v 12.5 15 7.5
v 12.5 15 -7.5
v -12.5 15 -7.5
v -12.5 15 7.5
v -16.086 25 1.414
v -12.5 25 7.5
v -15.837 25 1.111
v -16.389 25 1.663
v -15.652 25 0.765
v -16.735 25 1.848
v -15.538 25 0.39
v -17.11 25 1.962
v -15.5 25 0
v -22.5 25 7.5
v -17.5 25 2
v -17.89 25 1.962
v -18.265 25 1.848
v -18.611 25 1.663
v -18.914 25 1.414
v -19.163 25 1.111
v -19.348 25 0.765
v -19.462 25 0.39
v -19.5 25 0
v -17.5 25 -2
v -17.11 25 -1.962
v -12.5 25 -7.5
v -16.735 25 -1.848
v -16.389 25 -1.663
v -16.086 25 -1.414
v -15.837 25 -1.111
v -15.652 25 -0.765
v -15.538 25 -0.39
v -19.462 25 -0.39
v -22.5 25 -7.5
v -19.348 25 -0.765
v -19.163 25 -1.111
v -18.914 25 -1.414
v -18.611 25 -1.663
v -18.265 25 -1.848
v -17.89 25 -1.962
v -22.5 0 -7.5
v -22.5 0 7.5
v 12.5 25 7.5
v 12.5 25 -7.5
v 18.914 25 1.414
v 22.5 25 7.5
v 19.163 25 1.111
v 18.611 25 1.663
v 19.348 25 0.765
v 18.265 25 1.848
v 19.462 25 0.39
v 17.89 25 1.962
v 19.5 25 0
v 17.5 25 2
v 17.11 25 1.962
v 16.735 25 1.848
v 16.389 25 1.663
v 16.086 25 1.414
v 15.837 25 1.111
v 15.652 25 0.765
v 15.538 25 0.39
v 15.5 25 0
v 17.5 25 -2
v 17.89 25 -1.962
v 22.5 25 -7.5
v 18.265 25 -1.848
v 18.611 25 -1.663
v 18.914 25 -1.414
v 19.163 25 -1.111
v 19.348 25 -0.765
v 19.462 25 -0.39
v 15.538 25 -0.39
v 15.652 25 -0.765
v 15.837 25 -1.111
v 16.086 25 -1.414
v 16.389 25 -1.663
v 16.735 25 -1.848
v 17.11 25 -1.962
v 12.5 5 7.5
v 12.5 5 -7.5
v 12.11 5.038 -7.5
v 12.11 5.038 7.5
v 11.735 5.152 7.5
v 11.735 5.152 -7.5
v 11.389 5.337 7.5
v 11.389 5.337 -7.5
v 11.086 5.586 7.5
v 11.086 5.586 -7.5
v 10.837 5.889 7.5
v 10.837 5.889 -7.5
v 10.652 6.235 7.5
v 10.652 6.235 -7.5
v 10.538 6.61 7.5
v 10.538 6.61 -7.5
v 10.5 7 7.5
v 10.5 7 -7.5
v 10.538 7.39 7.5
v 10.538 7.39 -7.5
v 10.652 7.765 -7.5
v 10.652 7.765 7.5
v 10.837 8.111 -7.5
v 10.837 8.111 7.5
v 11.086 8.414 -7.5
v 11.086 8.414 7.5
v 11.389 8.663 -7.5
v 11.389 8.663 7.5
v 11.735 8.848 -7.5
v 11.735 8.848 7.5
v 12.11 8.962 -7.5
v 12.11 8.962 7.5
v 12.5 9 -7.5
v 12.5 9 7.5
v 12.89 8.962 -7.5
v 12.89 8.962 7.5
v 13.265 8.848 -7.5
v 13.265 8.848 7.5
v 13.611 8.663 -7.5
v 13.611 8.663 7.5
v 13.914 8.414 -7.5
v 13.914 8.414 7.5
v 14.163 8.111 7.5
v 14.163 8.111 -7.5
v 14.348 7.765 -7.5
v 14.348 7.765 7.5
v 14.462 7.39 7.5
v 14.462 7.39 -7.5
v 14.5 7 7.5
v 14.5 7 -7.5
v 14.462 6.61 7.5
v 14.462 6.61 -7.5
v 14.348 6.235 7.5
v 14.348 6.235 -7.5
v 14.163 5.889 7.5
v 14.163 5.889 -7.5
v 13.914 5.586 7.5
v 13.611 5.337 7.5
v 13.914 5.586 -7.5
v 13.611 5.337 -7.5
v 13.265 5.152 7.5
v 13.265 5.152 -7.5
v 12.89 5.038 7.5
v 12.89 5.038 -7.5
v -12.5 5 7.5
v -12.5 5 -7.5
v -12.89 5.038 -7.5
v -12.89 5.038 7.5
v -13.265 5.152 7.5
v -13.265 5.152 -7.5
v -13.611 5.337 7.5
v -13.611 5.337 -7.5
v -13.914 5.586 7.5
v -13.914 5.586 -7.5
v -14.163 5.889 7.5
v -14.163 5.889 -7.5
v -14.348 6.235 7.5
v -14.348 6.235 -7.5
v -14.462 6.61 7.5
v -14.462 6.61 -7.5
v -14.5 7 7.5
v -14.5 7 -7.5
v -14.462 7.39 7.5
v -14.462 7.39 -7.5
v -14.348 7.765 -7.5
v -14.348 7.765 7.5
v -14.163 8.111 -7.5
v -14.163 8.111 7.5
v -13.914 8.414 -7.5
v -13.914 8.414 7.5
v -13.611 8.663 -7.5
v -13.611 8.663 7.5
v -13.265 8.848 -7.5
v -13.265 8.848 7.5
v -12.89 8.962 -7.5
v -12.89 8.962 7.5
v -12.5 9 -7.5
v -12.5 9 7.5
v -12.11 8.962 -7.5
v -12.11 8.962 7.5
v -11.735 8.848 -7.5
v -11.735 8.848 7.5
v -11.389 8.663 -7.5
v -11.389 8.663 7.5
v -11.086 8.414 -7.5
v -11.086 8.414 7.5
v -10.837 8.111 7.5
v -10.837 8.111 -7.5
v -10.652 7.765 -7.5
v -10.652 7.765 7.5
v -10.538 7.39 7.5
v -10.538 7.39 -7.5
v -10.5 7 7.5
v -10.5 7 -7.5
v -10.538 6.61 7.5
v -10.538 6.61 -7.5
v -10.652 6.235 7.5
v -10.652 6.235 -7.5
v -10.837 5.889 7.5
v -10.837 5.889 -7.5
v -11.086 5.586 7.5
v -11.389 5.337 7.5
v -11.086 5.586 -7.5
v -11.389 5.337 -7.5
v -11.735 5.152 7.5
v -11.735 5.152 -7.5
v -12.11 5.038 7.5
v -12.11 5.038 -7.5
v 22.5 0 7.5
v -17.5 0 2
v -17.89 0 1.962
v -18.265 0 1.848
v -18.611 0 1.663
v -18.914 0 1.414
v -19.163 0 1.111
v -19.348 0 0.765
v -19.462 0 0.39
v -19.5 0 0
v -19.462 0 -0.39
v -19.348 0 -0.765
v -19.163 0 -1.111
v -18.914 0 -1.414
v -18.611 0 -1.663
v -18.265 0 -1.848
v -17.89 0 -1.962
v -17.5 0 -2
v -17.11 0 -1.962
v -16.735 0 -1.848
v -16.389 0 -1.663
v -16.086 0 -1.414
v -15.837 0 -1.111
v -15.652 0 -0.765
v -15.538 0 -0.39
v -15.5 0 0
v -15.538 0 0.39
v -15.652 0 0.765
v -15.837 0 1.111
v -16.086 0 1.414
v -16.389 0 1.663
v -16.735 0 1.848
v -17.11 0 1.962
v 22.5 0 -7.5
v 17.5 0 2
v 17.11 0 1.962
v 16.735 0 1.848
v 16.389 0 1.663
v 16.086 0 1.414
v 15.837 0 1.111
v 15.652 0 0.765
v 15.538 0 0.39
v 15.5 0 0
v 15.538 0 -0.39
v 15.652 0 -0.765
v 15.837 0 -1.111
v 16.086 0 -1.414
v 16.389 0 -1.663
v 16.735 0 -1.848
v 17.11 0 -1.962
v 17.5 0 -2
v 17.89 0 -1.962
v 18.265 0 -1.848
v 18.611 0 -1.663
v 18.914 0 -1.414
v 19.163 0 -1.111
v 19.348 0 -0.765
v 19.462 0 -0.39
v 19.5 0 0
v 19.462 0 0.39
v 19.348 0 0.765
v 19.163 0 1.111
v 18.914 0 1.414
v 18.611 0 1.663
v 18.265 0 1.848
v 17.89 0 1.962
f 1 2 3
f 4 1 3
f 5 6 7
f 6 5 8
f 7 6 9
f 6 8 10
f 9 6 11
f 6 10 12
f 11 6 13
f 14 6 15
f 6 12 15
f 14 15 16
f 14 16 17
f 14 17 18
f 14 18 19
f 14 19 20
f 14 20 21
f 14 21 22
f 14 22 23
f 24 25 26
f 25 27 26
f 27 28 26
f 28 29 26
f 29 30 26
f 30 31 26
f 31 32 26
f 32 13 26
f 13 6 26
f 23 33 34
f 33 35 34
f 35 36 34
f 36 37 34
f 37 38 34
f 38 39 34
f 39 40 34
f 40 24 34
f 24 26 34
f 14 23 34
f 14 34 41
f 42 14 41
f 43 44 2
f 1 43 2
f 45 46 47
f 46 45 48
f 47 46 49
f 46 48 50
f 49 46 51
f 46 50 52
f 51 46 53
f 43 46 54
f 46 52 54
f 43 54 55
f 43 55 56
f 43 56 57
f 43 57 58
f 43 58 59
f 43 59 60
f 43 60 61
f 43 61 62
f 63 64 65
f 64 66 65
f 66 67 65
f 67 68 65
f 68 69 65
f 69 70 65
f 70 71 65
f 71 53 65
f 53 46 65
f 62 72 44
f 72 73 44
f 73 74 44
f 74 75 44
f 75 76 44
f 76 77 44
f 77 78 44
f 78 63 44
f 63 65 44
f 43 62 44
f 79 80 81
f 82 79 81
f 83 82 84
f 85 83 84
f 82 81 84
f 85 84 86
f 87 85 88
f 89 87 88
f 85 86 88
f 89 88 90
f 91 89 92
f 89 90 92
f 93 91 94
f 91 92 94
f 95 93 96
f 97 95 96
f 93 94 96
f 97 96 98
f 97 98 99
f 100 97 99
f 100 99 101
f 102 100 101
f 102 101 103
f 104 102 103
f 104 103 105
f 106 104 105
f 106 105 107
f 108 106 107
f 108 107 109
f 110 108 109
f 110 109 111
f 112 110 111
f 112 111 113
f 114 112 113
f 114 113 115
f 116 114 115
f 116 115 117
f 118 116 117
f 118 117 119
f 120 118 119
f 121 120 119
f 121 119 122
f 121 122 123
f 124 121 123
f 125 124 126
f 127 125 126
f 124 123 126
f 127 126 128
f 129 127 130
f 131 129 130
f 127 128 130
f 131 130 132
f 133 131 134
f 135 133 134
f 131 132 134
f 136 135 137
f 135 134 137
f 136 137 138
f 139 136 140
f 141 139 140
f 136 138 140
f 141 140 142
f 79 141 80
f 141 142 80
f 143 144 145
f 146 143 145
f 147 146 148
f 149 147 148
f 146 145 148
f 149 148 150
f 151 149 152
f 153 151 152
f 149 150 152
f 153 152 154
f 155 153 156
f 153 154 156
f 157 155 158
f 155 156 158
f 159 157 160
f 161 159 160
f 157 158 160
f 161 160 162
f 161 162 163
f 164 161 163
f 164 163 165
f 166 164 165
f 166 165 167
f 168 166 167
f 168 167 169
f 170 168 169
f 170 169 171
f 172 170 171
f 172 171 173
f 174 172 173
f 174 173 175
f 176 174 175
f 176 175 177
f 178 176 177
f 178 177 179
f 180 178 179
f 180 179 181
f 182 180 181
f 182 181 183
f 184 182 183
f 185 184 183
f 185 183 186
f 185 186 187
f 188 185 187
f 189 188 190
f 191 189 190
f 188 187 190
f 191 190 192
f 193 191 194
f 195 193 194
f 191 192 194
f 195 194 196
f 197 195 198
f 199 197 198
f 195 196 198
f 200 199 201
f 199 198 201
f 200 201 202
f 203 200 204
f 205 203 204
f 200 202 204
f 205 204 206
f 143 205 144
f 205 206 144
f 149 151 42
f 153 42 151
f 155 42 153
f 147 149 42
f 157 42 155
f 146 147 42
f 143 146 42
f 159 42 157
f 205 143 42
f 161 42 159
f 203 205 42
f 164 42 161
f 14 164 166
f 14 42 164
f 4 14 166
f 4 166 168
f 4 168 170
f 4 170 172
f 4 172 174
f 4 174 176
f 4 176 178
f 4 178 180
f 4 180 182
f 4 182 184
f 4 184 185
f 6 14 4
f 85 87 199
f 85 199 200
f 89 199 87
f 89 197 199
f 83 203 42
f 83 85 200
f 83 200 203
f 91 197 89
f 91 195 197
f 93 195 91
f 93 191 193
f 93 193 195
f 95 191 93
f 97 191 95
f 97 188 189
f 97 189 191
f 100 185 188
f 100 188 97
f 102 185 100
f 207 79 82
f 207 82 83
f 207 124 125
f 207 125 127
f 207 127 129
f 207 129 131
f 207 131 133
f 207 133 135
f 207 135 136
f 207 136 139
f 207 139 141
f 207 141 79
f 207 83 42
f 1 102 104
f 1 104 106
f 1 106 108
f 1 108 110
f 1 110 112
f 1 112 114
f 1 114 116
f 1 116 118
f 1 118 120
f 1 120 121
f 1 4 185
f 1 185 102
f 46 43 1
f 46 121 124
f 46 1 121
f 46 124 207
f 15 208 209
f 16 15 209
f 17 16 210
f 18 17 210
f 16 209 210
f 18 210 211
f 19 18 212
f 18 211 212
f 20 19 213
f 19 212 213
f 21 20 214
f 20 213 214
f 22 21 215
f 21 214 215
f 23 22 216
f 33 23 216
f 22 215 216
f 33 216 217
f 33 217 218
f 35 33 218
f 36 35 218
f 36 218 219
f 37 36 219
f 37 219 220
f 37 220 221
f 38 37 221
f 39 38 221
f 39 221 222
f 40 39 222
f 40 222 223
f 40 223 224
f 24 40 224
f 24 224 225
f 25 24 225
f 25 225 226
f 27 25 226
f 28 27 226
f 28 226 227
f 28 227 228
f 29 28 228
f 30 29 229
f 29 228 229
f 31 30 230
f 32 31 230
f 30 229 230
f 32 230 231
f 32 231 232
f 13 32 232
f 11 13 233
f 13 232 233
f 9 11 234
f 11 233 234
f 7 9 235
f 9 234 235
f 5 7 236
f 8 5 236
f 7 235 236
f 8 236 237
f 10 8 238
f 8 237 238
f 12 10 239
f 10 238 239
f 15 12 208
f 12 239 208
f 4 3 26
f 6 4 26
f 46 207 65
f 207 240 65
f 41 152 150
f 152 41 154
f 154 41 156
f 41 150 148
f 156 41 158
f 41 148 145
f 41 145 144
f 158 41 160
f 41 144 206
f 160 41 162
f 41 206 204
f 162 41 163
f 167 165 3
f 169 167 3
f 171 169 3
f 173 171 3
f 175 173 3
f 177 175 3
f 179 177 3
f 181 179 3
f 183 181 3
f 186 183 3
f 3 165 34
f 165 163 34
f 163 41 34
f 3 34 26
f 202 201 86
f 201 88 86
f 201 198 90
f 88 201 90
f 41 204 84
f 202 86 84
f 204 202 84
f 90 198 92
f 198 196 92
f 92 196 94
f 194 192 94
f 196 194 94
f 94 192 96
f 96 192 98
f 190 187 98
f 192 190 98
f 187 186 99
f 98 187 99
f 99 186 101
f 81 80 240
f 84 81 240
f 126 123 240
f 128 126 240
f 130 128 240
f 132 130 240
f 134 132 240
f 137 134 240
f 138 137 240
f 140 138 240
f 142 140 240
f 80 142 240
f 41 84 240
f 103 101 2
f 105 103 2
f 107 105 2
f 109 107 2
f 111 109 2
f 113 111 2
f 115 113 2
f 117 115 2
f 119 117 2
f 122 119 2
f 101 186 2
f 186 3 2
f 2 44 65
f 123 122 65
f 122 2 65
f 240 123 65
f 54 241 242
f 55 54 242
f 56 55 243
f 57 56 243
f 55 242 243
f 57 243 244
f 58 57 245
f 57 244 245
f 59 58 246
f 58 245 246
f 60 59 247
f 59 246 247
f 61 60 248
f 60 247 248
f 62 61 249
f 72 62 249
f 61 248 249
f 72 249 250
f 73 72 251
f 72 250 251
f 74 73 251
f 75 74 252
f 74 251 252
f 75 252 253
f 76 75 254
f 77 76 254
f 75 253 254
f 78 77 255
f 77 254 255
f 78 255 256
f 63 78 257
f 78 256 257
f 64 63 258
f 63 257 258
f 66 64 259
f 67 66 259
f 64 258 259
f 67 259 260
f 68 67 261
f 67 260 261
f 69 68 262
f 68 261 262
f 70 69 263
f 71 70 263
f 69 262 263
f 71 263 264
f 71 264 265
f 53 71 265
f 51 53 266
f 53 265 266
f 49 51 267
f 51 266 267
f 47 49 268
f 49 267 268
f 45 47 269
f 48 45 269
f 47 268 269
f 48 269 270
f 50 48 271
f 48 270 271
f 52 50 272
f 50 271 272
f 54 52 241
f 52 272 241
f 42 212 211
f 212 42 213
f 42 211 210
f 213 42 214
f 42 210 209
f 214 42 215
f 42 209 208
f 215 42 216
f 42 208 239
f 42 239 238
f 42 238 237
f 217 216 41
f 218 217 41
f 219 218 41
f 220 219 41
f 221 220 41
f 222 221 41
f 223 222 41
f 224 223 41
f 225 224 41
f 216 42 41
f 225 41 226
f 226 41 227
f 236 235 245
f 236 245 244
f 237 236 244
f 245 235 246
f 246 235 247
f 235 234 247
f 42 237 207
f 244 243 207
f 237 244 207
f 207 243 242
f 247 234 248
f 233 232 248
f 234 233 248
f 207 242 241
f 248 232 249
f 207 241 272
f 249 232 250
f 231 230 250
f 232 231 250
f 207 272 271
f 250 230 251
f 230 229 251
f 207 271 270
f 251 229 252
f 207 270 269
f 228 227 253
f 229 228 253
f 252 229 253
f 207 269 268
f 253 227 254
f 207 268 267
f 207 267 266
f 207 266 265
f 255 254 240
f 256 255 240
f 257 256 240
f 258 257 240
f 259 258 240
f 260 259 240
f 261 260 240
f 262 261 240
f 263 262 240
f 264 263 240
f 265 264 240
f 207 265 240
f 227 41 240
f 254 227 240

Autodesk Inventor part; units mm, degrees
ref_plane "YZ Plane" through (0, 0, 0) normal (1, 0, 0) x (0, 1, 0)
ref_plane "XZ Plane" through (0, 0, 0) normal (0, 1, 0) x (-1, 0, 0)
ref_plane "XY Plane" through (0, 0, 0) normal (0, 0, 1) x (1, 0, 0)
sketch "Sketch1" plane through (0, 0, 0) normal (0, 0, 1) x (1, 0, 0)
  line L0 (-22.5, 0) -> (22.5, 0)
  line L1 (22.5, 0) -> (22.5, 25)
  line L2 (22.5, 25) -> (12.5, 25)
  line L3 (12.5, 25) -> (12.5, 15)
  line L4 (12.5, 15) -> (-12.5, 15)
  line L5 (-12.5, 15) -> (-12.5, 25)
  line L6 (-12.5, 25) -> (-22.5, 25)
  line L7 (-22.5, 25) -> (-22.5, 0)
  point P0 (0, 0)
  point P1 (0, 0)
  dimension "d0" = 45
  dimension "d1" = 25
  dimension "d2" = 10
  dimension "d3" = 10
extrude "Extrusion1" add sketch "Sketch1" along normal mid plane 15
sketch "Sketch2" plane through (12.5, 25, -7.5) normal (0, 1, 0) x (1, 0, 0)
  line L0 (0, 0) -> (10, 0) projected
  line L1 (0, 0) -> (0, -15) projected
  line L2 (10, -15) -> (0, -15) projected
  line L3 (10, 0) -> (10, -15) projected
  line L4 (-35, 0) -> (-25, 0) projected
  line L5 (-35, 0) -> (-35, -15) projected
  line L6 (-25, -15) -> (-35, -15) projected
  line L7 (-25, 0) -> (-25, -15) projected
  line L8 (-25, 0) -> (-25, -15) projected
  line L9 (5, -7.5) -> (-30, -7.5)
  point P0 (-12.5, -7.5)
  point P1 (-12.5, -7.5)
  dimension "d6" = 35
hole "Hole1" at (17.5, 25, 0) at (-17.5, 25, 0) direction (0, -1, 0) diameter 4 end through all
sketch "Sketch3" plane through (0, 0, 7.5) normal (0, 0, 1) x (1, 0, 0)
  line L0 (12.5, 7) -> (-12.5, 7) construction
  line L1 (0, 0) -> (0, 14) construction
  line L2 (12.5, 15) -> (-12.5, 15) projected
  point P0 (0, 7)
  dimension "d14" = 8
  dimension "d15" = 25
hole "Hole2" at (12.5, 7, 7.5) at (-12.5, 7, 7.5) direction (0, 0, -1) diameter 4 end through all
properties part number "sujetador inferior"
